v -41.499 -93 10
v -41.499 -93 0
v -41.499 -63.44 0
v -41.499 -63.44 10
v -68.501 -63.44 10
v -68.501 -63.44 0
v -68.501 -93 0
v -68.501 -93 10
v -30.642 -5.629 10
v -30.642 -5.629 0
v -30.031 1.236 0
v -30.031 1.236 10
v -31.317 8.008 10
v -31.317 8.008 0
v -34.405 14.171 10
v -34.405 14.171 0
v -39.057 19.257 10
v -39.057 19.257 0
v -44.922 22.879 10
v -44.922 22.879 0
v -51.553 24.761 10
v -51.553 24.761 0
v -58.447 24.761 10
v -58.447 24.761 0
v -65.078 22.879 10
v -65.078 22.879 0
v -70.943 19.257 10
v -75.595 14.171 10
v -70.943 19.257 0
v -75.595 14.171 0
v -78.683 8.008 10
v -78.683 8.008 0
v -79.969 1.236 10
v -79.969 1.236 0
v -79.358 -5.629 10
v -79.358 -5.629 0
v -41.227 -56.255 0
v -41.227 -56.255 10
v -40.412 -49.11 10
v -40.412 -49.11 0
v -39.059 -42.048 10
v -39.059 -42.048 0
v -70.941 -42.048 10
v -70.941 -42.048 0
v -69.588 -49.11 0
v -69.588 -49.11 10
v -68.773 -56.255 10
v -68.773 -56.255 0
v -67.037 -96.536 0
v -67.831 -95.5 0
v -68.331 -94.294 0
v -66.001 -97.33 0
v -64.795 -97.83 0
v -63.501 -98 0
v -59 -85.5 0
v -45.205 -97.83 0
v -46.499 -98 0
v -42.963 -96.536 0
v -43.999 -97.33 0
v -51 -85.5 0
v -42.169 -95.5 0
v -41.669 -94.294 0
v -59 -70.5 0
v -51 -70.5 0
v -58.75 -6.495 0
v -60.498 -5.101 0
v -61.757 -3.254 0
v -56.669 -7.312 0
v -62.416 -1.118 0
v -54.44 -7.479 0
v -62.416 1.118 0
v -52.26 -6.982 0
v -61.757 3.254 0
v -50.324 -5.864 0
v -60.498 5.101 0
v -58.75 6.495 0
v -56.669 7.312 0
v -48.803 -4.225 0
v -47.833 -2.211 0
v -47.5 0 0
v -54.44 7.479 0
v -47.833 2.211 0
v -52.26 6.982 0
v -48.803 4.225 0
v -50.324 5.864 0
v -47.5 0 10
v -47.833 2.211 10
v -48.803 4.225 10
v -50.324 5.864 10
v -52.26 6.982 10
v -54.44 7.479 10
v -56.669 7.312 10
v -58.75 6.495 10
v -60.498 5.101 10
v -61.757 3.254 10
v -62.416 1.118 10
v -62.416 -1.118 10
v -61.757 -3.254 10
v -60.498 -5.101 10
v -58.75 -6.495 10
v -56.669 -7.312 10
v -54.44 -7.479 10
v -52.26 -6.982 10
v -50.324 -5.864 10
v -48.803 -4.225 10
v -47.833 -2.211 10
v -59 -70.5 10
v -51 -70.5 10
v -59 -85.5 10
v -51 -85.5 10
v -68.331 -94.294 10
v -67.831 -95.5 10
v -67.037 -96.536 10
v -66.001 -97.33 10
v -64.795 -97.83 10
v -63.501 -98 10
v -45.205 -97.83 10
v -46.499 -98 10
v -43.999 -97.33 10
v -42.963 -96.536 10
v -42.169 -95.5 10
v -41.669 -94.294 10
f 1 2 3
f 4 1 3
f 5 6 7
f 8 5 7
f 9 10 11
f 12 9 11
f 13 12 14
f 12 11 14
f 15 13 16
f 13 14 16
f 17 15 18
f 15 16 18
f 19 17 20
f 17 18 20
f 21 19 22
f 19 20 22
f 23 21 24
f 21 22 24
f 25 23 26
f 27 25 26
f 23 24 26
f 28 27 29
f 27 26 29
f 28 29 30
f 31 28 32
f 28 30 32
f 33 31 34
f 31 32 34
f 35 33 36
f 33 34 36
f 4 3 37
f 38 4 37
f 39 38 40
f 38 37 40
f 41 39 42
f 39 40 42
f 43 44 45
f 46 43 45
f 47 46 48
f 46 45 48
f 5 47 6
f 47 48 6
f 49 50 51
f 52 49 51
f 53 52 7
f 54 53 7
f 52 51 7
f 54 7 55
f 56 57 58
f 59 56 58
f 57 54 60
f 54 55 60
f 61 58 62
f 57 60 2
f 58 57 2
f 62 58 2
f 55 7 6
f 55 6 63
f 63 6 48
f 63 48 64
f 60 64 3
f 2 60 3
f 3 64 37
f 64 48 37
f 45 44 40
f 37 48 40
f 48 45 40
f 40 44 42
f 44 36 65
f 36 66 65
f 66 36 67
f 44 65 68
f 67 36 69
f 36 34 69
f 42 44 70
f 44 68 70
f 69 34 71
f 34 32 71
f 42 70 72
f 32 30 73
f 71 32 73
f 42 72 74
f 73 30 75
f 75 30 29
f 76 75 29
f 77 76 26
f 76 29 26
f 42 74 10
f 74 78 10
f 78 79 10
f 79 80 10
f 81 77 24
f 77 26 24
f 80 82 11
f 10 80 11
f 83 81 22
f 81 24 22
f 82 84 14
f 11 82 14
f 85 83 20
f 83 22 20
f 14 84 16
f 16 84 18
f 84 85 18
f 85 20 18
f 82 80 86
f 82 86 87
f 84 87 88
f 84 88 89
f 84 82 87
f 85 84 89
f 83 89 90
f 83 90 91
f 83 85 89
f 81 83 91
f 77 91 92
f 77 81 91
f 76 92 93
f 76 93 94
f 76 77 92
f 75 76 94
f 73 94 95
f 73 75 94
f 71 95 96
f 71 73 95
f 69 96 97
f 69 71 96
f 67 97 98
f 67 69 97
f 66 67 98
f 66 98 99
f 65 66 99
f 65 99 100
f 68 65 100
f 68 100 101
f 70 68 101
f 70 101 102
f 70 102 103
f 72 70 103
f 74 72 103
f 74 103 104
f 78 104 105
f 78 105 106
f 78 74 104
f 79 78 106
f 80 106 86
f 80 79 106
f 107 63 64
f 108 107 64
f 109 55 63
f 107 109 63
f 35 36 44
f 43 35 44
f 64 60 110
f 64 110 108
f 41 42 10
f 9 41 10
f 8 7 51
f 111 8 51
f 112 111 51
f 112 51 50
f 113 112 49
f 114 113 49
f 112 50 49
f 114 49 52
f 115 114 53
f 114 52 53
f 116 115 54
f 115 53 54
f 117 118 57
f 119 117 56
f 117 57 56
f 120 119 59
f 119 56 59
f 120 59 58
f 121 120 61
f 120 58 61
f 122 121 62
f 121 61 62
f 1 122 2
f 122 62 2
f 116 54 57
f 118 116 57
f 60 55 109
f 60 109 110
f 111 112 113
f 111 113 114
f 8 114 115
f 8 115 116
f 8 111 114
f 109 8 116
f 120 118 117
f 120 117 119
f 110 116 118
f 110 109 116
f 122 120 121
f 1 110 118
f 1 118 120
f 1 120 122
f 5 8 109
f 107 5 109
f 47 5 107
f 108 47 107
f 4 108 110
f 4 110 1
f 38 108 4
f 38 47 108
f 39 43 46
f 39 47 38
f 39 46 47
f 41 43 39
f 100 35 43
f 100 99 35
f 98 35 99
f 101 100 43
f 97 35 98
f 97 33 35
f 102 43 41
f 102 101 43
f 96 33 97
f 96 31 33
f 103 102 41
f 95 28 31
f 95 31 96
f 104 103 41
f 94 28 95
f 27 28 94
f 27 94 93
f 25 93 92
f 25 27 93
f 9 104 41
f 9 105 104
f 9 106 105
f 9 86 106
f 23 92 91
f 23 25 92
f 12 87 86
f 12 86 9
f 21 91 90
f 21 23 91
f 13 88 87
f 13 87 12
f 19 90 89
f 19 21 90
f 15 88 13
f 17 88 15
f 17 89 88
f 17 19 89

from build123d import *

# Parameters (mm, degrees)
SKETCH1_R           = 7.5
SKETCH1_W           = 8
SKETCH1_H           = 15
BOSS_EXTRUDE1_DEPTH = 10


with BuildPart() as part:
    # Sketch1 → Boss-Extrude1 (new body)
    with BuildSketch(Plane.XY):
        with BuildLine():
            Line((-79.357935679, -5.629473283), (-70.941049916, -42.048149016))
            ThreePointArc((-70.941049916, -42.048149016), (-69.113137448, -52.674804492), (-68.501205497, -63.440147491))
            Line((-68.501205497, -63.440147491), (-68.501205497, -93))
            ThreePointArc((-68.501205497, -93), (-67.036739403, -96.535533906), (-63.501205497, -98))
            Line((-63.501205497, -98), (-46.498794503, -98))
            ThreePointArc((-46.498794503, -98), (-42.963260597, -96.535533906), (-41.498794503, -93))
            Line((-41.498794503, -93), (-41.498794503, -63.440147491))
            ThreePointArc((-41.498794503, -63.440147491), (-40.886862552, -52.674804492), (-39.058950084, -42.048149016))
            Line((-39.058950084, -42.048149016), (-30.642064321, -5.629473283))
            ThreePointArc((-30.642064321, -5.629473283), (-55, 25), (-79.357935679, -5.629473283))
        make_face()
        with Locations((-55, 0)):
            Circle(SKETCH1_R, mode=Mode.SUBTRACT)
        with Locations((-55, -78)):
            Rectangle(SKETCH1_W, SKETCH1_H, mode=Mode.SUBTRACT)
    extrude(amount=BOSS_EXTRUDE1_DEPTH)


solid = part.part
